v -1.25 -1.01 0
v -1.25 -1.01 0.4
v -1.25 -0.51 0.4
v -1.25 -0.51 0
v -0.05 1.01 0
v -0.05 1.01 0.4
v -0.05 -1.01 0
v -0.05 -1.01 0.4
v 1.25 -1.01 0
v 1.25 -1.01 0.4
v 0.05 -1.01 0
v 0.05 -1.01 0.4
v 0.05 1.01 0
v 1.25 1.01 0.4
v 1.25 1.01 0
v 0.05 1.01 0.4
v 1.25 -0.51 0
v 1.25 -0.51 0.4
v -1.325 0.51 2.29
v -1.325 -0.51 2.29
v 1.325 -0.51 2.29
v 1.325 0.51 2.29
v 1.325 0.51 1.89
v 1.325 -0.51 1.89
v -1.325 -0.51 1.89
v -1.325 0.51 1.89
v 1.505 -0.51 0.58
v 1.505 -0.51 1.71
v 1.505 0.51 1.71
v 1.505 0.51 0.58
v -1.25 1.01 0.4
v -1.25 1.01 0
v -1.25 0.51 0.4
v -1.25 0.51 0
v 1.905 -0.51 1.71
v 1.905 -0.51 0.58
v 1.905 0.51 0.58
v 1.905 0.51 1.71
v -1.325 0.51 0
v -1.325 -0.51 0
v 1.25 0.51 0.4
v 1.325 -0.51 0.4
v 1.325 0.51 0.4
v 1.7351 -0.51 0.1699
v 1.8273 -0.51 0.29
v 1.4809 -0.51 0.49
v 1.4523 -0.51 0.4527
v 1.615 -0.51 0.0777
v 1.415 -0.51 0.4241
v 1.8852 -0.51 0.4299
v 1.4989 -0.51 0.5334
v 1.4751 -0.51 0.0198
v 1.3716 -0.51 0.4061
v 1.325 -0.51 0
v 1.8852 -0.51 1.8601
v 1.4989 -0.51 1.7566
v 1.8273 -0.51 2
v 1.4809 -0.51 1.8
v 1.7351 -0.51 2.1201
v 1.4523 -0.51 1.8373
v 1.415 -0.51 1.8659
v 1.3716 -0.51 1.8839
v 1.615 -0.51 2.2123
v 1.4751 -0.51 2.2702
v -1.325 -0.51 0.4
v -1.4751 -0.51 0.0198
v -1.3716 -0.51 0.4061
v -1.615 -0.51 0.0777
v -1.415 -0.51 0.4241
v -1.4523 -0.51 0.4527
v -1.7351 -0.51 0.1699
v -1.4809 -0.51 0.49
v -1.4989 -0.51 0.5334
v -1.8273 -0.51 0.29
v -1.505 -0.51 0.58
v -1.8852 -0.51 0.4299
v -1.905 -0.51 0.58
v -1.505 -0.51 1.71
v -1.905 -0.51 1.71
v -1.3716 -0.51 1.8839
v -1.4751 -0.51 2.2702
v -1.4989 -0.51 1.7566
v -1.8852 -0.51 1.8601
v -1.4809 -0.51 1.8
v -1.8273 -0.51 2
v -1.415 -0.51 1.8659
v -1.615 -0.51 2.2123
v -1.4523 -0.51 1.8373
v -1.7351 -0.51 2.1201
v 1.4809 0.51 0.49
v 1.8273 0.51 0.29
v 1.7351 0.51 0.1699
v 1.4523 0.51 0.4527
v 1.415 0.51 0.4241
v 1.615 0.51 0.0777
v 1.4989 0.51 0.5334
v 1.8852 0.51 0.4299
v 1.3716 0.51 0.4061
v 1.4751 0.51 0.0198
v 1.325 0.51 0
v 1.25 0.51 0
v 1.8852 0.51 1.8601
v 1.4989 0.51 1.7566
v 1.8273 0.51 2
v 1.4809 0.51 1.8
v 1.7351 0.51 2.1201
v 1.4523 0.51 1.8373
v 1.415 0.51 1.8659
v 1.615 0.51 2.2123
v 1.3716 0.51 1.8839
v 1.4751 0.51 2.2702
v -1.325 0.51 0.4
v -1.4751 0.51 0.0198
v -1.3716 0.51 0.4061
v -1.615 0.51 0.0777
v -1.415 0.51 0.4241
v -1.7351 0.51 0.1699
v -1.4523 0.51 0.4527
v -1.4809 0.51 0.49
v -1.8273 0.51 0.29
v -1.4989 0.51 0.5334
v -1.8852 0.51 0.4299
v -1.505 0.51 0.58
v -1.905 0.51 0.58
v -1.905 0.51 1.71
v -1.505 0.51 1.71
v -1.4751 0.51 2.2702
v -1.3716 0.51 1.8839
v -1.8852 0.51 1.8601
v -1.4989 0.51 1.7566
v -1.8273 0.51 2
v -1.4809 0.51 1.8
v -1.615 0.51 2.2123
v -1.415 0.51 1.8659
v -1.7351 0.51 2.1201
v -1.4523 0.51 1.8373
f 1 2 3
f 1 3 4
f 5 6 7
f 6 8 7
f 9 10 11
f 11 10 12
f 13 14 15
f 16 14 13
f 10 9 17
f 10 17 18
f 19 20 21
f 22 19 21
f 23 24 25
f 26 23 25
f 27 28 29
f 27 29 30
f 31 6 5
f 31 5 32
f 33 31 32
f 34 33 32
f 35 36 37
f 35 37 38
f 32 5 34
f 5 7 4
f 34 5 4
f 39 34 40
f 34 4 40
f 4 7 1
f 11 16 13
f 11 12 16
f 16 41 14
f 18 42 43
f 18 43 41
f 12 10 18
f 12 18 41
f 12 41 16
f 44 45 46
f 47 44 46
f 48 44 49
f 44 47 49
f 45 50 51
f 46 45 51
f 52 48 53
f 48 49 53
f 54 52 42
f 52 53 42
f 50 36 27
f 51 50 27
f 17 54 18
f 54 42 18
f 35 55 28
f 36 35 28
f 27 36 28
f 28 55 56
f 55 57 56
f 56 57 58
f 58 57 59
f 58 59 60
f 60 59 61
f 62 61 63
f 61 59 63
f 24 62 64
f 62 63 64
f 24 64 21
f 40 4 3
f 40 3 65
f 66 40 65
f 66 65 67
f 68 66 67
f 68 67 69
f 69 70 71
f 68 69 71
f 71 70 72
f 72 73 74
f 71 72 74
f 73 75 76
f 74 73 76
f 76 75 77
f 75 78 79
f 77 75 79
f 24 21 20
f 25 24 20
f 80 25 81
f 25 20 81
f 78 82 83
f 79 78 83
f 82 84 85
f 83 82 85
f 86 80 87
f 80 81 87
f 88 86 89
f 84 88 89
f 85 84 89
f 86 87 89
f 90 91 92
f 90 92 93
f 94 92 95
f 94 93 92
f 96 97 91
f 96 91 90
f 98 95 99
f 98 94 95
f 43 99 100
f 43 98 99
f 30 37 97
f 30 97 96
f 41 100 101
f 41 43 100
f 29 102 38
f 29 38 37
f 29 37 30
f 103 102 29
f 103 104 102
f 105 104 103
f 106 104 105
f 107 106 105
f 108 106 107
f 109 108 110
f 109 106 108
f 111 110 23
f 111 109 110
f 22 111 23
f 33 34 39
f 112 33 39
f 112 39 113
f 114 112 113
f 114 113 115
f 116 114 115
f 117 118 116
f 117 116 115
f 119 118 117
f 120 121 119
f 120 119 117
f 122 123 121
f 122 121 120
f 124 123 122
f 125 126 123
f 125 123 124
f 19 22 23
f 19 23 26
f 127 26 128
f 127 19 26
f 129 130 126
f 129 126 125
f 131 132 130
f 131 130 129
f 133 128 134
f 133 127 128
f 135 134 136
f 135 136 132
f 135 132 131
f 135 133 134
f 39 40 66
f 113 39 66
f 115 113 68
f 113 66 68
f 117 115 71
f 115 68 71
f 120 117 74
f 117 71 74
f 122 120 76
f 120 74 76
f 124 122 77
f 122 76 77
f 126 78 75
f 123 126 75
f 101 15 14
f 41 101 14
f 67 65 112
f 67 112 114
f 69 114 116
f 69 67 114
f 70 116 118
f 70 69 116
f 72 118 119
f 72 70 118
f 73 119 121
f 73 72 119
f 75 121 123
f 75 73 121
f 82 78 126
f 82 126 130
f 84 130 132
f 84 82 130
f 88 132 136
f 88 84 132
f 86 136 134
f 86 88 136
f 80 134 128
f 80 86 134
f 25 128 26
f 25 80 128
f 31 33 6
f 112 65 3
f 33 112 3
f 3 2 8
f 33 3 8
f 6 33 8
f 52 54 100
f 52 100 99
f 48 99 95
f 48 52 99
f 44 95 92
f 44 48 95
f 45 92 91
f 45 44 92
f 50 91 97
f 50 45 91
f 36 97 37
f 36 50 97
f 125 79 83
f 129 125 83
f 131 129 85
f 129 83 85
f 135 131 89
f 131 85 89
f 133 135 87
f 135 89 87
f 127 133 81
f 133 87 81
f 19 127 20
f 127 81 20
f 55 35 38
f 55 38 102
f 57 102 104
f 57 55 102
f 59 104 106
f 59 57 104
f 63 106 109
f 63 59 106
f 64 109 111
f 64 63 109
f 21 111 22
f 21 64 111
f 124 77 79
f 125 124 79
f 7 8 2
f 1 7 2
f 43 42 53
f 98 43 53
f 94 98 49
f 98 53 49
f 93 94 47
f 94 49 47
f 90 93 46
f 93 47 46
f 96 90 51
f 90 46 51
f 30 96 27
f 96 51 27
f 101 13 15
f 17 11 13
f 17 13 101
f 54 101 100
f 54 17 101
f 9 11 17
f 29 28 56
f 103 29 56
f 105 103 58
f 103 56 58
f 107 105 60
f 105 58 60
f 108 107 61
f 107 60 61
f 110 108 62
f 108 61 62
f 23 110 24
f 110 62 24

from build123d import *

# Parameters (mm, degrees)
PAD_DEPTH    = 1.01
POCKET_DEPTH = 0.5


with BuildPart() as part:
    # Sketch → Pad (new body, symmetric)
    with BuildSketch(Plane.XZ):
        with BuildLine():
            Line((0.05, 0), (1.325, 0))
            ThreePointArc((1.325, 0), (1.735122, 0.169878), (1.905, 0.58))
            Line((1.905, 0.58), (1.905, 1.71))
            ThreePointArc((1.905, 1.71), (1.735122, 2.120122), (1.325, 2.29))
            Line((1.325, 2.29), (0, 2.29))
            Line((0, 2.29), (0, 1.89))
            Line((0, 1.89), (1.325, 1.89))
            ThreePointArc((1.505, 1.71), (1.452279, 1.837279), (1.325, 1.89))
            Line((1.505, 1.71), (1.505, 0.58))
            ThreePointArc((1.325, 0.4), (1.452279, 0.452721), (1.505, 0.58))
            Line((1.325, 0.4), (0.05, 0.4))
            Line((0.05, 0.4), (0.05, 0))
        make_face()
    pad = extrude(amount=PAD_DEPTH, both=True)

    # Mirrored: Pad across Sketch V_Axis
    add(pad.mirror(Plane(origin=(0, 0, 0), x_dir=(0, -1, 0), z_dir=(1, 0, 0))))

    # Sketch001 (on Face5 of Mirrored) → Pocket (cut)
    with BuildSketch(Plane.XZ.offset(1.01)):
        Polygon((1.25, -0.501321), (1.25, 0.766681), (-1.25, 0.766681), (-1.25, -0.501321), (-2.34865, -0.501321), (-2.34865, 2.758472), (2.34865, 2.758472), (2.34865, -0.501321), align=None)
    pocket = extrude(amount=-POCKET_DEPTH, mode=Mode.SUBTRACT)

    # Mirrored001: Pocket across XZ
    add(pocket.mirror(Plane.XZ), mode=Mode.SUBTRACT)


solid = part.part
